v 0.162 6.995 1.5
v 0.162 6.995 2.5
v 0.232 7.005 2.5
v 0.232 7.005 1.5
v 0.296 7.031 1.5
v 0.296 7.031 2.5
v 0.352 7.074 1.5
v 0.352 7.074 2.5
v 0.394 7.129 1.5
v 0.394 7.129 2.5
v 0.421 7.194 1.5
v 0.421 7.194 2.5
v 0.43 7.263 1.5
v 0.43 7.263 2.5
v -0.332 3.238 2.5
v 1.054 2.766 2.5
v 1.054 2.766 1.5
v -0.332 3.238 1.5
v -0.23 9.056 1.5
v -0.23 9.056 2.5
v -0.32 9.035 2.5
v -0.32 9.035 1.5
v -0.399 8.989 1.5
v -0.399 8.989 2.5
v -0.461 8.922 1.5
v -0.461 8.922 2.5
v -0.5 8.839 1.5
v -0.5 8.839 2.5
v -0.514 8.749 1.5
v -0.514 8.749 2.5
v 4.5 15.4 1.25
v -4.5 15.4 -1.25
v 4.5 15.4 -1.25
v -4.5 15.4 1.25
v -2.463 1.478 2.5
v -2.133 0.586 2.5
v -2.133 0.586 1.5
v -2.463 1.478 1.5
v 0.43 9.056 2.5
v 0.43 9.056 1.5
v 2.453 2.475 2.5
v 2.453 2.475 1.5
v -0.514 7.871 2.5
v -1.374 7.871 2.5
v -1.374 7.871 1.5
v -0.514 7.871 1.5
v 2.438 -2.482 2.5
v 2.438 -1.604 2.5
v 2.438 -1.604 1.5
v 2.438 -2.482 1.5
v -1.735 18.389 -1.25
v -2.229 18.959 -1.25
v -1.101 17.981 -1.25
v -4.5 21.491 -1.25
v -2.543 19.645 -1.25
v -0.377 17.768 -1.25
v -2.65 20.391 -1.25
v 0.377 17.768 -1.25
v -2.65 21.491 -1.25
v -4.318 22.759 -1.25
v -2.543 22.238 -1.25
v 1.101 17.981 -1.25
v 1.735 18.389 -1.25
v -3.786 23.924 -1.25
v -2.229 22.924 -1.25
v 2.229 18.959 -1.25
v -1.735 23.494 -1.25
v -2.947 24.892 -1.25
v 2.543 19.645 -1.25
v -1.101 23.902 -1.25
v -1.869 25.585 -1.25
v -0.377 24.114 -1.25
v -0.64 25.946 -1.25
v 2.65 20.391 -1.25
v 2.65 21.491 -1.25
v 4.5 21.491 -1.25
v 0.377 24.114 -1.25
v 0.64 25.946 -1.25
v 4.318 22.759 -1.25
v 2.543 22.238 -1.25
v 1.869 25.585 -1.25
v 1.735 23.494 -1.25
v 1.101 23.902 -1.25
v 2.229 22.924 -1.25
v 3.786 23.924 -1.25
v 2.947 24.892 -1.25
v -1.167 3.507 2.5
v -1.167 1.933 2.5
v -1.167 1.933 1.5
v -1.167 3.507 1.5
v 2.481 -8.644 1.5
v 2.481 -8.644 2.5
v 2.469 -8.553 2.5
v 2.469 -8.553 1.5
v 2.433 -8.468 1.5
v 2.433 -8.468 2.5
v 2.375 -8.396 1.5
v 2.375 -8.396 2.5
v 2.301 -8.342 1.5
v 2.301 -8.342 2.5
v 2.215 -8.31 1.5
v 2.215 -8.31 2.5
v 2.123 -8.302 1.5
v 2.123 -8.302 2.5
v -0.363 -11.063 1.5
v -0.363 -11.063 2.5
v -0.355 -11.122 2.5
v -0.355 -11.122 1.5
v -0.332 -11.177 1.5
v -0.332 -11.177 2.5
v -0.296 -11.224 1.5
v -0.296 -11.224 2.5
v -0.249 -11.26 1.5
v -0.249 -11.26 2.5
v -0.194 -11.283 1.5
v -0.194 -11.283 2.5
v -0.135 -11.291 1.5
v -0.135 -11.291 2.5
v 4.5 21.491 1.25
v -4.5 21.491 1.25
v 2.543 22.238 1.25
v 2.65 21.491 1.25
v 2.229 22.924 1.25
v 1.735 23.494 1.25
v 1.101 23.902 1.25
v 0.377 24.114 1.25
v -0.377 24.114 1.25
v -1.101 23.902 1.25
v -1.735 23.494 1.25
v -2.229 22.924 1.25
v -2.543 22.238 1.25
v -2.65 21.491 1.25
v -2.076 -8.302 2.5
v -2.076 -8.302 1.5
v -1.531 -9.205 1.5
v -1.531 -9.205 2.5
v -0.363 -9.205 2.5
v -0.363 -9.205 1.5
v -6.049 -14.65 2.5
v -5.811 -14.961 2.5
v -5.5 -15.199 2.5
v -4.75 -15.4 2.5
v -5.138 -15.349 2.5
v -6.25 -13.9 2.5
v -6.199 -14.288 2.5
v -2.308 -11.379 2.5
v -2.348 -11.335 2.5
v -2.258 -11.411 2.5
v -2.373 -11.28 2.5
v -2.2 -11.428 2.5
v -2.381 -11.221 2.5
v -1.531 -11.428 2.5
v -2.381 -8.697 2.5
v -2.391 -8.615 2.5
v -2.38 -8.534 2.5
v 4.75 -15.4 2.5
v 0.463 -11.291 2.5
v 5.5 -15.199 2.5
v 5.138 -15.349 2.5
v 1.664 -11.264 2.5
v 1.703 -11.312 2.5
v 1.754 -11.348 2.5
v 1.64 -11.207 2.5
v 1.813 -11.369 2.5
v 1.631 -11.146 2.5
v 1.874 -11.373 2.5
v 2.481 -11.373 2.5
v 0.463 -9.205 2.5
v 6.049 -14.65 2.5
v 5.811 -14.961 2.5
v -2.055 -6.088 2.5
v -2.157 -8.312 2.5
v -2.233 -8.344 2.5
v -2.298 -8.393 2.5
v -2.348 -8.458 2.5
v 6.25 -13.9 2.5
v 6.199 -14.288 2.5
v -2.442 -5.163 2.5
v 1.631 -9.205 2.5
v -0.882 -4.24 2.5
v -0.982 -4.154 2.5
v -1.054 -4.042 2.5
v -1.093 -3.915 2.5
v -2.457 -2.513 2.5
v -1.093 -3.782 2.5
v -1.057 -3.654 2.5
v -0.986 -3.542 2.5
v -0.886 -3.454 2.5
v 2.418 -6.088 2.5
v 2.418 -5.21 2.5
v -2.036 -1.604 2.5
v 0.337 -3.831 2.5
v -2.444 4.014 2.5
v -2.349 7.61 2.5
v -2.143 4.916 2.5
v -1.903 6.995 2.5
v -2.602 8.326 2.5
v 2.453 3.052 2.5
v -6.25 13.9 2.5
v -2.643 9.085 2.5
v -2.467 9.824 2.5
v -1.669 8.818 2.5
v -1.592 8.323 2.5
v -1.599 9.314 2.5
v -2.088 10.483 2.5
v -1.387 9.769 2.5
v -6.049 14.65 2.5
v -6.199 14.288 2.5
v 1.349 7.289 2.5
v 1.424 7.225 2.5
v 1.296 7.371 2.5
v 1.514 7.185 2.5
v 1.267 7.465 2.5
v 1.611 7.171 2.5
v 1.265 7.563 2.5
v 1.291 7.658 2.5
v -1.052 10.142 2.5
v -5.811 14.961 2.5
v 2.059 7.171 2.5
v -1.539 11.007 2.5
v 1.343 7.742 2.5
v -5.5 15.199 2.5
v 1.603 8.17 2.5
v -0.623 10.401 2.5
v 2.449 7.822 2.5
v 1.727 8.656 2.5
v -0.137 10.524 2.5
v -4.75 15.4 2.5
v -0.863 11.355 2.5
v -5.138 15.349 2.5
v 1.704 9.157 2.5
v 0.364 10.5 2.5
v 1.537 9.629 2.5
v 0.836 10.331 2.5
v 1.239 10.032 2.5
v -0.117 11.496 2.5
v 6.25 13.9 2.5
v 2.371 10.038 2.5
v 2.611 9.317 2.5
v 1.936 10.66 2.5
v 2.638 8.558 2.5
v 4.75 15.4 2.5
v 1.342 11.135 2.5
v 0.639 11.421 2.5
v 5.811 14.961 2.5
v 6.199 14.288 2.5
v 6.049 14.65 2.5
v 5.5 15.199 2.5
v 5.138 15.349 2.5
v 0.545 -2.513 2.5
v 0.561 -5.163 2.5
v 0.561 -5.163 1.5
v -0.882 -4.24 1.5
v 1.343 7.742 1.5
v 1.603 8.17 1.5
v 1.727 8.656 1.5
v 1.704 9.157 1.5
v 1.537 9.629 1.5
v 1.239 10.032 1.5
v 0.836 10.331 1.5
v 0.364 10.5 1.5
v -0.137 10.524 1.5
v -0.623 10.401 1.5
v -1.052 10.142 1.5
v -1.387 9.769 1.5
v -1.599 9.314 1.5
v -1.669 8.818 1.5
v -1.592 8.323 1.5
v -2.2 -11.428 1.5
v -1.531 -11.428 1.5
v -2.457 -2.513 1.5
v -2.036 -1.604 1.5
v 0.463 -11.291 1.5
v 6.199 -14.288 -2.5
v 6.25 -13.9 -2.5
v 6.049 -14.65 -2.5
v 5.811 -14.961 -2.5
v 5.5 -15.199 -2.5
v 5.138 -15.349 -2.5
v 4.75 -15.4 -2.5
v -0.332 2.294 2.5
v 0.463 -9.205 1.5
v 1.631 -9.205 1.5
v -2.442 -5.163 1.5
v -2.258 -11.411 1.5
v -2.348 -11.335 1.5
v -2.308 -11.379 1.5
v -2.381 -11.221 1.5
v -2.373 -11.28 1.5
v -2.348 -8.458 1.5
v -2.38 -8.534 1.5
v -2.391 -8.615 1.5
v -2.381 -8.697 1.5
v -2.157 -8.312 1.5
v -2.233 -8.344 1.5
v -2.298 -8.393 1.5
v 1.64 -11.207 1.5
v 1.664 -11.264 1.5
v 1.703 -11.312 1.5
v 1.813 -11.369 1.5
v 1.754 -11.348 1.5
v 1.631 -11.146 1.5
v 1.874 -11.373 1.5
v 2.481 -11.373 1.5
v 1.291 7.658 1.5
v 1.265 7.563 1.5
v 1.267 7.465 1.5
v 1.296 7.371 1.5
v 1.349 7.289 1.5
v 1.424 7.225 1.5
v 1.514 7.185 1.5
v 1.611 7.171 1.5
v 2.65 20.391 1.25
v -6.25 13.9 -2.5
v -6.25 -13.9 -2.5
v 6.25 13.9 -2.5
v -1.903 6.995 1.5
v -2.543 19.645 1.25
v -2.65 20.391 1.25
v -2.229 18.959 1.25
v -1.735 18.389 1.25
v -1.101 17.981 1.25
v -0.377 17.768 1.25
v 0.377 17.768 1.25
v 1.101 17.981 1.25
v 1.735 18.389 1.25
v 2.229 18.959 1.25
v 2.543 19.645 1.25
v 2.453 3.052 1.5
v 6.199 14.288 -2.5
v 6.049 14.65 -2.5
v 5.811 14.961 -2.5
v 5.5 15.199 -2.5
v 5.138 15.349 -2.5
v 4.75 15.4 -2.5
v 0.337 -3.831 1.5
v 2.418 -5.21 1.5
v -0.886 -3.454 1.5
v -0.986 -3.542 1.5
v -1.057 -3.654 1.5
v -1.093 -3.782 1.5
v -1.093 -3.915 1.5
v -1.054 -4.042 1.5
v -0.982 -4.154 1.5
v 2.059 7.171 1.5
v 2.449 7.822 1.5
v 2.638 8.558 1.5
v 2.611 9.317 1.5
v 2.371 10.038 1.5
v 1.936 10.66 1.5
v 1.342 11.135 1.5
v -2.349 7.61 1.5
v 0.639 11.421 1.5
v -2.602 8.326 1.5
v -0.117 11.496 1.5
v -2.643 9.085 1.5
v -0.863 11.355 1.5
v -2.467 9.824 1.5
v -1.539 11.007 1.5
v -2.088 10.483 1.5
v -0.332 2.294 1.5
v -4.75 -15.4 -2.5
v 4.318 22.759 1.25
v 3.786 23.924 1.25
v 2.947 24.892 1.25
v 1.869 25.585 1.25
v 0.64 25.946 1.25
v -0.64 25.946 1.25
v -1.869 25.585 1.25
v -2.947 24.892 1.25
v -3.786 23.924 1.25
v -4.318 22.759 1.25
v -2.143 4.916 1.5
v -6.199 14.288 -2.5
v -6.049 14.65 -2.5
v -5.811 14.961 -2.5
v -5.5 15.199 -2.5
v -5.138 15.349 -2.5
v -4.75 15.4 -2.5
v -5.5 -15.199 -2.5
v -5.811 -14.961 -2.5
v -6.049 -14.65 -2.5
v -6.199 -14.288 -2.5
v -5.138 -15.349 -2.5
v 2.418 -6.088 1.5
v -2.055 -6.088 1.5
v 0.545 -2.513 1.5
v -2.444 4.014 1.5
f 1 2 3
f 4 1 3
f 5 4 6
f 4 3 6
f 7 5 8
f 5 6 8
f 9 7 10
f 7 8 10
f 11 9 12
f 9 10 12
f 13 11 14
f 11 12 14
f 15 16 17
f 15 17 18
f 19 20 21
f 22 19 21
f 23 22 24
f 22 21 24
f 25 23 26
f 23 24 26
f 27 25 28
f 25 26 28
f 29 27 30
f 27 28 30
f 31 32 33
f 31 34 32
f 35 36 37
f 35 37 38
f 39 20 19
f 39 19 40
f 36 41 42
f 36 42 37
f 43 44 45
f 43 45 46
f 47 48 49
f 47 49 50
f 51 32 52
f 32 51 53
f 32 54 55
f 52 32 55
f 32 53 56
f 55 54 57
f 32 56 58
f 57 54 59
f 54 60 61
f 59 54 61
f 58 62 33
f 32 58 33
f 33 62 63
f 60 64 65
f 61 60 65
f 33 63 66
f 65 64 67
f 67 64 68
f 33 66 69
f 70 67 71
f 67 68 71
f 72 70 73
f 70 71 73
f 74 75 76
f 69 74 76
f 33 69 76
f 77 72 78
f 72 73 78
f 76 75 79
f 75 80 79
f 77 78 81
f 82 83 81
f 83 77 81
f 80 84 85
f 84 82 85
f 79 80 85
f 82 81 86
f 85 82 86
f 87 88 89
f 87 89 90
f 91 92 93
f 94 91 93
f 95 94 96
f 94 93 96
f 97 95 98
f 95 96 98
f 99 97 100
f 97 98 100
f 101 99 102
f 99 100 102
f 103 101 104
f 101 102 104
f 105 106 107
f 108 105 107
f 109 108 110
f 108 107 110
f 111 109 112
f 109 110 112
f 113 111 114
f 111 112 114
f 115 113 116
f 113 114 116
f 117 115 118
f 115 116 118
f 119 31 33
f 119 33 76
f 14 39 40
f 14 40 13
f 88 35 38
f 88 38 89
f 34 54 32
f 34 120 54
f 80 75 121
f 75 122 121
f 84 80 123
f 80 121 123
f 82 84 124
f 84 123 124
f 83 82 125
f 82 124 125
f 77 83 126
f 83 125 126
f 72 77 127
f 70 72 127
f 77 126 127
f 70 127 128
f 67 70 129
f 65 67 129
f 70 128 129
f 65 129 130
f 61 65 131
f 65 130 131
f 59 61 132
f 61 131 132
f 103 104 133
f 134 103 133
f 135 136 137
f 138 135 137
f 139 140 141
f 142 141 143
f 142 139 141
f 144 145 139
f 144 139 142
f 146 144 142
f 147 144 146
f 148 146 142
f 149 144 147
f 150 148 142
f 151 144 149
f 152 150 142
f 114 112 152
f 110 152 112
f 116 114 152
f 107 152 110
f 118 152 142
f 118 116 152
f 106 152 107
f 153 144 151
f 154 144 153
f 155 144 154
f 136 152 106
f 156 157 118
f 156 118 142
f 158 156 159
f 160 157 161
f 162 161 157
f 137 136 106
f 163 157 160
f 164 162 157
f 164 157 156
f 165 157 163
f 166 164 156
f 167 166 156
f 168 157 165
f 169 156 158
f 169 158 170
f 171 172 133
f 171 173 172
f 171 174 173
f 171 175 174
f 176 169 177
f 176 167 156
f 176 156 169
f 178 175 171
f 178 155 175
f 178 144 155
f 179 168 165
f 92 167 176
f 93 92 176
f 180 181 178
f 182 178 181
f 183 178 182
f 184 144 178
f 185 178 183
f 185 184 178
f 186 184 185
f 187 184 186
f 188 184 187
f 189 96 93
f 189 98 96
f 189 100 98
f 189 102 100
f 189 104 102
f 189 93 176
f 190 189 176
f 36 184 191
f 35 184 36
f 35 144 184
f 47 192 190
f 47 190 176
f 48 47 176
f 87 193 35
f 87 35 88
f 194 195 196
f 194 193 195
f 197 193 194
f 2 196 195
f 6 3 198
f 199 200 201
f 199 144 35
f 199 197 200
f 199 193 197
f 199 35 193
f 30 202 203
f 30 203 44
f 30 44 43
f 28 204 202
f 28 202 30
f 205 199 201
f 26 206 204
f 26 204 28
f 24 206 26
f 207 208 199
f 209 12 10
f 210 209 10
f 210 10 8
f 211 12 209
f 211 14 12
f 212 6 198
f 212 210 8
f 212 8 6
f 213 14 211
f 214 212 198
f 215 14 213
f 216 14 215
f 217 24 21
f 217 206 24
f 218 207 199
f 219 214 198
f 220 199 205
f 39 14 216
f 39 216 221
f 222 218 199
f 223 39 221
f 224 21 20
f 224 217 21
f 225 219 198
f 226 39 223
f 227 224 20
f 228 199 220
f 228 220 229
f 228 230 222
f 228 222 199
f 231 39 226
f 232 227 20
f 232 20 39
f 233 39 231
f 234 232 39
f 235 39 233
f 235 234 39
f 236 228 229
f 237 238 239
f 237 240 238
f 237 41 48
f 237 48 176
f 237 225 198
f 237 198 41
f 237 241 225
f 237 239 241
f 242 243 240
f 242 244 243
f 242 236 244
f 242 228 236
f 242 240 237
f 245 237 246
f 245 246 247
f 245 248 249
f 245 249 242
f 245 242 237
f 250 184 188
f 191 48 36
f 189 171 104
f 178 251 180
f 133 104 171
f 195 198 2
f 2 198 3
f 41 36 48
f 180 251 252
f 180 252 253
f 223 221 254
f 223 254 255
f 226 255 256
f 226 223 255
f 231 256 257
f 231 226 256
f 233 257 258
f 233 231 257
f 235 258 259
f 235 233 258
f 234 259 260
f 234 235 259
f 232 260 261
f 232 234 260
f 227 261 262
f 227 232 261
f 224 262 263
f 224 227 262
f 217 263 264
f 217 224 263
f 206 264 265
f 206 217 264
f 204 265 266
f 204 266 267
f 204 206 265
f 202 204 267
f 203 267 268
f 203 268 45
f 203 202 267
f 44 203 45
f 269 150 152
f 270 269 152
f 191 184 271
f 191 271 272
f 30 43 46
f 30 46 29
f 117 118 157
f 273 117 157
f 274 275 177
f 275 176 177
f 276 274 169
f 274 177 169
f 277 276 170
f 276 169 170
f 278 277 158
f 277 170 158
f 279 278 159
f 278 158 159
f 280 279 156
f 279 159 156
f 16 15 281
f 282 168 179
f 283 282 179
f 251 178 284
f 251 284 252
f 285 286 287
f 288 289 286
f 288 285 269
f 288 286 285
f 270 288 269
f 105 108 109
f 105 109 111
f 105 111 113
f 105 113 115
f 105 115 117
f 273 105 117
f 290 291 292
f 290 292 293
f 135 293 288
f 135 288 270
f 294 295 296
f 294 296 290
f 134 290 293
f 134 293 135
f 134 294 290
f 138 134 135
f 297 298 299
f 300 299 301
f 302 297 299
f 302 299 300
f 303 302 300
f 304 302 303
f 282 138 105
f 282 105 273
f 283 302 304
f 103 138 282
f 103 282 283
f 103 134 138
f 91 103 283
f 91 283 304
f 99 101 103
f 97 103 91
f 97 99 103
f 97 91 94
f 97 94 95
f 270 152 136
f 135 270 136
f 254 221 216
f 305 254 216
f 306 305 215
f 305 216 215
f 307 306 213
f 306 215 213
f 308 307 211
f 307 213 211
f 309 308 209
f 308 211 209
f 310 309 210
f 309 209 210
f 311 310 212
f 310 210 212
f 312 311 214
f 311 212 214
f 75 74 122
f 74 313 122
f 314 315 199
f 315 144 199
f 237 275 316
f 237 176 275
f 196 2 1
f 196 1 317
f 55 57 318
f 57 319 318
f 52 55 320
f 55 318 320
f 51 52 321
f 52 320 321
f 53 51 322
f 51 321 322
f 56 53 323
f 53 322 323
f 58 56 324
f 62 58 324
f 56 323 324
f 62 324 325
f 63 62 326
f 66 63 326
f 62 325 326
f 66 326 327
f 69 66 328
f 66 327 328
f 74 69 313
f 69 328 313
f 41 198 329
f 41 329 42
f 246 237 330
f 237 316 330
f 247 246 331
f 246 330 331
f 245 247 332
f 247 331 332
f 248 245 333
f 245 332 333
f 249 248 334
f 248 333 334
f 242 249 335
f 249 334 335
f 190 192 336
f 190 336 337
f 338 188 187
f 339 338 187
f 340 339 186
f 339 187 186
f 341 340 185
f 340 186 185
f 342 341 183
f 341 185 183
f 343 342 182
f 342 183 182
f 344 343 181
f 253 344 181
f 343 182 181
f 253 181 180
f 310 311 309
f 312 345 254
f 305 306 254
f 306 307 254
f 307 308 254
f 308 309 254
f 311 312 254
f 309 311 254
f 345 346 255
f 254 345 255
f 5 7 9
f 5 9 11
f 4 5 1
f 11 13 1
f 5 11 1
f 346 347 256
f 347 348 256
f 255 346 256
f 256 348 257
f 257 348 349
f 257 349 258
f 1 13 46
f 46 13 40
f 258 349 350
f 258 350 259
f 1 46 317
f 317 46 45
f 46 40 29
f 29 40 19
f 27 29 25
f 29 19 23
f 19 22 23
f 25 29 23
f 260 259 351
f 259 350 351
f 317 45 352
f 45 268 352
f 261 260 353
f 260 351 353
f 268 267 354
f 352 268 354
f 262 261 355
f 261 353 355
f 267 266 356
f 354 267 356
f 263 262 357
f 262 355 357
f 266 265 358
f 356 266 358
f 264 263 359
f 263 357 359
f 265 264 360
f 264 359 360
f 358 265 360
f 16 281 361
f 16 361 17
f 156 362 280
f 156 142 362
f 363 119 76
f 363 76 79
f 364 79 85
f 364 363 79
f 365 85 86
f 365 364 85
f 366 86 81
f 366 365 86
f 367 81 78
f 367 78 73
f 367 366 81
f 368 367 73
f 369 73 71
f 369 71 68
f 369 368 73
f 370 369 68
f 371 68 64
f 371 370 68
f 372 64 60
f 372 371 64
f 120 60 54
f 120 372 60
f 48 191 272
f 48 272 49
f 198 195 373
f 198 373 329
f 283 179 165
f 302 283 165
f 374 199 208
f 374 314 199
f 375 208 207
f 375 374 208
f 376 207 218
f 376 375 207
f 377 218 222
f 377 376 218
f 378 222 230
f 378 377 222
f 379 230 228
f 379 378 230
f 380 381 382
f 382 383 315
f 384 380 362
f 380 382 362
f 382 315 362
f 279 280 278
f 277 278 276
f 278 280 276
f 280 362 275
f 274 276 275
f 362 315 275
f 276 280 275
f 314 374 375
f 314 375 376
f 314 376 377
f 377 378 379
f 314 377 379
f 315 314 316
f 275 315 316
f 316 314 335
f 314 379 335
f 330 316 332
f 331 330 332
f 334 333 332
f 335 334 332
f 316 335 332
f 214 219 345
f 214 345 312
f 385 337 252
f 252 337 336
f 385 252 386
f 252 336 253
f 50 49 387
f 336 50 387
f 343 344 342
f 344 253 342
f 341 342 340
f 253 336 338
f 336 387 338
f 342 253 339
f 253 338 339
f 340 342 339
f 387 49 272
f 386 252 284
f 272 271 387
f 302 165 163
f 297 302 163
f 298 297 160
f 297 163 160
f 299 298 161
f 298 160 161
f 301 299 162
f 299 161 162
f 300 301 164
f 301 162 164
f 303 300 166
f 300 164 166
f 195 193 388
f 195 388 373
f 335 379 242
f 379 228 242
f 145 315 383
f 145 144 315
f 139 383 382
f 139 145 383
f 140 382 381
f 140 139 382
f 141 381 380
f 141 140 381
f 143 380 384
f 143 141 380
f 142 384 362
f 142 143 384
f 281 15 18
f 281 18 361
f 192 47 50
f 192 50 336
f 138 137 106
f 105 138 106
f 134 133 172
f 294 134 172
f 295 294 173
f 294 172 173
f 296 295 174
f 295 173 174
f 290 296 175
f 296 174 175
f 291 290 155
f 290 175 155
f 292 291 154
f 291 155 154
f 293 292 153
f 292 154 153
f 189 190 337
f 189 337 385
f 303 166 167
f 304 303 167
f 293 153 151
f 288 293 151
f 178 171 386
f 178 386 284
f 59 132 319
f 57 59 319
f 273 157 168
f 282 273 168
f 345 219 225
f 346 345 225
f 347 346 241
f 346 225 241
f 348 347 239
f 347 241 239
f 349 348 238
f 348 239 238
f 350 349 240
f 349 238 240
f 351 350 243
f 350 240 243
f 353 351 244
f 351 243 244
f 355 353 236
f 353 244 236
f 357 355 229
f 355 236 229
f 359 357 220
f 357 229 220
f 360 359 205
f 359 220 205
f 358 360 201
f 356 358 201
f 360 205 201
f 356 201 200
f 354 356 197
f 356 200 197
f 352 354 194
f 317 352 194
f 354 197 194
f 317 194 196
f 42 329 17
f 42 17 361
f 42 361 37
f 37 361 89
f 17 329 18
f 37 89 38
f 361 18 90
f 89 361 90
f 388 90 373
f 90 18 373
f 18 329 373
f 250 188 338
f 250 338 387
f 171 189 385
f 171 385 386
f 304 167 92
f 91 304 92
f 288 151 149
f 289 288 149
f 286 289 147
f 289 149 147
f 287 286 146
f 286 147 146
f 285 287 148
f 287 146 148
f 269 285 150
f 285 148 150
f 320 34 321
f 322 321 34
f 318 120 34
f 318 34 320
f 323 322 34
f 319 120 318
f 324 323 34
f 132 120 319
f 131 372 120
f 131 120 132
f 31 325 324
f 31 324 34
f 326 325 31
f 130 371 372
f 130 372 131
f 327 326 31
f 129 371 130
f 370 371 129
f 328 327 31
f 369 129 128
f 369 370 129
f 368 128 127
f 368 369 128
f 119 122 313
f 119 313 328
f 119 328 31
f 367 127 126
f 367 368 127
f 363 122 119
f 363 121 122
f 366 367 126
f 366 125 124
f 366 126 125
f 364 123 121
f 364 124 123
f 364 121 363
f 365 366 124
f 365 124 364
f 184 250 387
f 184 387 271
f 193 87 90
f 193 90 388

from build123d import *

# Parameters (mm, degrees)
SKETCH_W     = 12.5
SKETCH_H     = 30.8
PAD_DEPTH    = 2.5
FILLET_R     = 1.5
POCKET_DEPTH = 1
PAD003_DEPTH = 1.25


with BuildPart() as rubber_puller:
    # Sketch → Pad (new body, symmetric)
    with BuildSketch(Plane.XY):
        Rectangle(SKETCH_W, SKETCH_H)
    extrude(amount=PAD_DEPTH, both=True)

    # Fillet
    fillet_edges = [rubber_puller.edges().sort_by_distance(p)[0] for p in [
        (6.25, 15.4, 0),
        (-6.25, 15.4, 0),
        (6.25, -15.4, 0),
        (-6.25, -15.4, 0),
    ]]
    fillet(fillet_edges, radius=FILLET_R)

    # Sketch002 → Pocket (cut)
    with BuildSketch(Plane.XY.offset(2.5)):
        with BuildLine():
            Line((2.058635, 7.170651), (1.610806, 7.170651))
            ThreePointArc((1.34296, 7.741509), (1.29552, 7.370985), (1.610806, 7.170651))
            ThreePointArc((1.34296, 7.741509), (0.114748, 10.530364), (-1.373665, 7.871258))
            Line((-1.373665, 7.871258), (-0.513986, 7.871258))
            Line((-0.513986, 7.871258), (-0.513986, 8.748692))
            ThreePointArc((-0.230489, 9.056394), (-0.432308, 8.957888), (-0.513986, 8.748692))
            Line((-0.230489, 9.056394), (0.429843, 9.056394))
            Line((0.429843, 9.056394), (0.429843, 7.262931))
            ThreePointArc((0.162389, 6.995477), (0.351508, 7.073812), (0.429843, 7.262931))
            Line((0.162389, 6.995477), (-1.902788, 6.995477))
            ThreePointArc((2.058635, 7.170651), (-0.117233, 11.496364), (-1.902788, 6.995477))
        make_face()
        Polygon((-2.443622, 4.013659), (-2.14313, 4.91588), (2.452536, 3.051914), (2.452536, 2.474867), (-2.133095, 0.586349), (-2.463233, 1.478149), (-1.167123, 1.932792), (-1.167123, 3.506557), align=None)
        Polygon((-0.332095, 3.238178), (-0.332095, 2.293919), (1.053634, 2.766049), align=None, mode=Mode.SUBTRACT)
        with BuildLine():
            Line((-2.457387, -2.513311), (-2.035587, -1.60428))
            Line((-2.035587, -1.60428), (2.437693, -1.60428))
            Line((2.437693, -1.60428), (2.437693, -2.481753))
            Line((2.437693, -2.481753), (0.337054, -3.830913))
            Line((0.337054, -3.830913), (2.41812, -5.210073))
            Line((2.41812, -5.210073), (2.41812, -6.087545))
            Line((2.41812, -6.087545), (-2.05516, -6.087545))
            Line((-2.05516, -6.087545), (-2.441861, -5.163037))
            Line((-2.441861, -5.163037), (0.560915, -5.163037))
            Line((0.560915, -5.163037), (-0.881533, -4.240265))
            ThreePointArc((-0.886372, -3.45376), (-1.097647, -3.848327), (-0.881533, -4.240265))
            Line((-0.886372, -3.45376), (0.544614, -2.513311))
            Line((0.544614, -2.513311), (-2.457387, -2.513311))
        make_face()
        with BuildLine():
            Line((-2.381374, -8.696545), (-2.381374, -11.221022))
            ThreePointArc((-2.381374, -11.221022), (-2.329613, -11.358433), (-2.200058, -11.427544))
            Line((-2.200058, -11.427544), (-1.531374, -11.427544))
            Line((-1.531374, -11.427544), (-1.531374, -9.205301))
            Line((-1.531374, -9.205301), (-0.362716, -9.205301))
            Line((-0.362716, -9.205301), (-0.362716, -11.063174))
            ThreePointArc((-0.362716, -11.063174), (-0.296064, -11.224086), (-0.135153, -11.290738))
            Line((-0.135153, -11.290738), (0.462527, -11.290738))
            Line((0.462527, -11.290738), (0.462527, -9.205301))
            Line((0.462527, -9.205301), (1.631185, -9.205301))
            Line((1.631185, -9.205301), (1.631185, -11.146011))
            ThreePointArc((1.631185, -11.146011), (1.703494, -11.312388), (1.874469, -11.373031))
            Line((1.874469, -11.373031), (2.481185, -11.373031))
            Line((2.481185, -11.373031), (2.481185, -8.643844))
            ThreePointArc((2.481185, -8.643844), (2.375308, -8.396199), (2.123126, -8.301635))
            Line((2.123126, -8.301635), (-2.07554, -8.301635))
            ThreePointArc((-2.07554, -8.301635), (-2.325284, -8.424104), (-2.381374, -8.696545))
        make_face()
    extrude(amount=-POCKET_DEPTH, mode=Mode.SUBTRACT)


with BuildPart() as metal_puller:
    # Sketch004 → Pad003 (new body, symmetric)
    with BuildSketch(Plane.XY):
        with BuildLine():
            Line((-4.5, 15.4), (4.5, 15.4))
            Line((4.5, 15.4), (4.5, 21.491394))
            ThreePointArc((4.5, 21.491394), (0, 25.991394), (-4.5, 21.491394))
            Line((-4.5, 21.491394), (-4.5, 15.4))
        make_face()
        with BuildLine():
            Line((-2.65, 21.491394), (-2.65, 20.391394))
            ThreePointArc((-2.65, 20.391394), (0, 17.741394), (2.65, 20.391394))
            Line((2.65, 20.391394), (2.65, 21.491394))
            ThreePointArc((2.65, 21.491394), (0, 24.141394), (-2.65, 21.491394))
        make_face(mode=Mode.SUBTRACT)
    extrude(amount=PAD003_DEPTH, both=True)


solid = Compound([rubber_puller.part, metal_puller.part])
